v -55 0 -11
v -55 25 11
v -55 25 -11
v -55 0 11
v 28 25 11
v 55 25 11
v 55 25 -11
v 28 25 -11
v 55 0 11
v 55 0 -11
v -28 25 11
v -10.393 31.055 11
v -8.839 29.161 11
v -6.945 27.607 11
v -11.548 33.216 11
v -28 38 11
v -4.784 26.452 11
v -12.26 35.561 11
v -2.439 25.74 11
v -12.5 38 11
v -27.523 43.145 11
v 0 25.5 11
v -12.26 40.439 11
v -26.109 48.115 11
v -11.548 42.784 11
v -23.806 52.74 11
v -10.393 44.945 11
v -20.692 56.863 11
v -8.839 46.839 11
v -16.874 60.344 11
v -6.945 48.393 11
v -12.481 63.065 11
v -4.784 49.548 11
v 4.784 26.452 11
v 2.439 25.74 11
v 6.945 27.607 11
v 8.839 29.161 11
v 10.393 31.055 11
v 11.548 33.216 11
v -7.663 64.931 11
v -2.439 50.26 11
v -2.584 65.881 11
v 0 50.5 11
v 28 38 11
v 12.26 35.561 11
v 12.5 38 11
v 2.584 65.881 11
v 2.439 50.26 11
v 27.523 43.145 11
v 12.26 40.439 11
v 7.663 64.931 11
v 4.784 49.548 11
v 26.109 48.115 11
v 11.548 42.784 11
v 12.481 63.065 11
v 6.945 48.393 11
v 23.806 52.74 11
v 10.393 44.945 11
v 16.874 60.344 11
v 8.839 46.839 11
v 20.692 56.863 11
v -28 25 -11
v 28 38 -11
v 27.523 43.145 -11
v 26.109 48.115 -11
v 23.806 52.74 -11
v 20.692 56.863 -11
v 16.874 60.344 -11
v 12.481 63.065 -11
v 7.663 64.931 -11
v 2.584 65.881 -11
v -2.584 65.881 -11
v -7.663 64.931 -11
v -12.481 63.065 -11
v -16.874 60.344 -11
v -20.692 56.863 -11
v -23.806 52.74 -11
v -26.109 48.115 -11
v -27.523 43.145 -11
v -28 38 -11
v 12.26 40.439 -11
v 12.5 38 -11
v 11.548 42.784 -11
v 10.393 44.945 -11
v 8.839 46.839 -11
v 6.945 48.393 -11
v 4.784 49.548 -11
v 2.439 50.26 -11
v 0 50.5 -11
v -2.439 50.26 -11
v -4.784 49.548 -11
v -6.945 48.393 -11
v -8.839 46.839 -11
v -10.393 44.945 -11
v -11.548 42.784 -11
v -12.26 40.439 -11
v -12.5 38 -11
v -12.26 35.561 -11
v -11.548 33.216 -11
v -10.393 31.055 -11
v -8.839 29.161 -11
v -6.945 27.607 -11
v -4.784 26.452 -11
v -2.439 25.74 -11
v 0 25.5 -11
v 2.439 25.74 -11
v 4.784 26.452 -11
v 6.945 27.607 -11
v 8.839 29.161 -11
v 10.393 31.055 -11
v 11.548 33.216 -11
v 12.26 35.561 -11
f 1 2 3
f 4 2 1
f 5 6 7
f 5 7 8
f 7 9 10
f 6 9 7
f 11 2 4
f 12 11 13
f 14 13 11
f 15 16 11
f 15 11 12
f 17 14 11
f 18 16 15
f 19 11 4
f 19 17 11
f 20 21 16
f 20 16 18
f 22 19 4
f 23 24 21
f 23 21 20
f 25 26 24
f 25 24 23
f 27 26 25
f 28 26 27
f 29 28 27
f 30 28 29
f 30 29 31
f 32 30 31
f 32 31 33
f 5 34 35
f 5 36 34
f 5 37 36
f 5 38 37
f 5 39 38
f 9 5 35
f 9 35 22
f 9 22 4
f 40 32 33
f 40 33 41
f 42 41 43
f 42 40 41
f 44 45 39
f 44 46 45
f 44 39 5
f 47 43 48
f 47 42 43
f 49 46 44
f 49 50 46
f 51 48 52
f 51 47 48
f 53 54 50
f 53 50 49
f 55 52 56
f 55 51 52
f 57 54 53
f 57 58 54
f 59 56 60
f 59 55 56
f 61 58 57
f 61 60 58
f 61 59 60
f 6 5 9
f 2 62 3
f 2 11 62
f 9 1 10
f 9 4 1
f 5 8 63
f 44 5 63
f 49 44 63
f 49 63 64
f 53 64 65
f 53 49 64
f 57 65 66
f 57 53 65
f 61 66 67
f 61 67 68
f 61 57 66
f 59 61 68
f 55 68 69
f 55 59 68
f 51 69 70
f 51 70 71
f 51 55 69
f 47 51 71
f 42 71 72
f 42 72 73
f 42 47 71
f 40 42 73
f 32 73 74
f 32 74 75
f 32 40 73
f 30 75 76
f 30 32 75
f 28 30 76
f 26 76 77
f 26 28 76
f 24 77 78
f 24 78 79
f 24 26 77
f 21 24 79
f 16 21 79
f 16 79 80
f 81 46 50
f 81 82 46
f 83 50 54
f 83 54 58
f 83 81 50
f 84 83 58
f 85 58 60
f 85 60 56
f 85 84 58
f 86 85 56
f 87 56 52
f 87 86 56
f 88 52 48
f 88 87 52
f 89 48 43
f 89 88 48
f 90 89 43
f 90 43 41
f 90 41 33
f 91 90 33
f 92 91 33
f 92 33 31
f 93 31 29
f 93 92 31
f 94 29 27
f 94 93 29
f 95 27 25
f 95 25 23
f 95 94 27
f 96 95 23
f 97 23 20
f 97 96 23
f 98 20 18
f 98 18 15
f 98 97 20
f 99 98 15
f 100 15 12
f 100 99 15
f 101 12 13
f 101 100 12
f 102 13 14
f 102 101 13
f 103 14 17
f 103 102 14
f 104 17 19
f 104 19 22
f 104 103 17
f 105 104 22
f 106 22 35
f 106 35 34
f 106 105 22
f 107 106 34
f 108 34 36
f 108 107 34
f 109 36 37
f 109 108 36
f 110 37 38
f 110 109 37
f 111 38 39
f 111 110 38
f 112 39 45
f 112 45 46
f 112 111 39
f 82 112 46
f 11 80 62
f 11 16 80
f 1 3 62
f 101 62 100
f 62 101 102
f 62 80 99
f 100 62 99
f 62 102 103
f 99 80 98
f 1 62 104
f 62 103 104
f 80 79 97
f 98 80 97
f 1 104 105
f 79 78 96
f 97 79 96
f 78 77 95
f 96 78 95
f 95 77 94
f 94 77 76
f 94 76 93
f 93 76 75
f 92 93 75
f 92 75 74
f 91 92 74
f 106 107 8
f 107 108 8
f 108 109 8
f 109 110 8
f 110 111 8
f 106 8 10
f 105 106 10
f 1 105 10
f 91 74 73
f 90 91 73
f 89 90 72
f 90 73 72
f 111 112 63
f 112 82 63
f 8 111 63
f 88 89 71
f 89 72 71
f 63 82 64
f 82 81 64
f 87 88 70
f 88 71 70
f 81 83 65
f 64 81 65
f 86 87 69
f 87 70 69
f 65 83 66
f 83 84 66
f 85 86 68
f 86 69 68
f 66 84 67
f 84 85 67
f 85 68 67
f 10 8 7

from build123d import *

# Parameters (mm, degrees)
SKETCH1_R           = 12.5
BOSS_EXTRUDE1_DEPTH = 11


with BuildPart() as part:
    # Sketch1 → Boss-Extrude1 (new body, symmetric)
    with BuildSketch(Plane.XY):
        with BuildLine():
            Line((-55, 0), (55, 0))
            Line((55, 0), (55, 25))
            Line((55, 25), (28, 25))
            Line((28, 25), (28, 38))
            ThreePointArc((28, 38), (0, 66), (-28, 38))
            Line((-28, 38), (-28, 25))
            Line((-28, 25), (-55, 25))
            Line((-55, 25), (-55, 0))
        make_face()
        with Locations((0, 38)):
            Circle(SKETCH1_R, mode=Mode.SUBTRACT)
    extrude(amount=BOSS_EXTRUDE1_DEPTH, both=True)


solid = part.part
